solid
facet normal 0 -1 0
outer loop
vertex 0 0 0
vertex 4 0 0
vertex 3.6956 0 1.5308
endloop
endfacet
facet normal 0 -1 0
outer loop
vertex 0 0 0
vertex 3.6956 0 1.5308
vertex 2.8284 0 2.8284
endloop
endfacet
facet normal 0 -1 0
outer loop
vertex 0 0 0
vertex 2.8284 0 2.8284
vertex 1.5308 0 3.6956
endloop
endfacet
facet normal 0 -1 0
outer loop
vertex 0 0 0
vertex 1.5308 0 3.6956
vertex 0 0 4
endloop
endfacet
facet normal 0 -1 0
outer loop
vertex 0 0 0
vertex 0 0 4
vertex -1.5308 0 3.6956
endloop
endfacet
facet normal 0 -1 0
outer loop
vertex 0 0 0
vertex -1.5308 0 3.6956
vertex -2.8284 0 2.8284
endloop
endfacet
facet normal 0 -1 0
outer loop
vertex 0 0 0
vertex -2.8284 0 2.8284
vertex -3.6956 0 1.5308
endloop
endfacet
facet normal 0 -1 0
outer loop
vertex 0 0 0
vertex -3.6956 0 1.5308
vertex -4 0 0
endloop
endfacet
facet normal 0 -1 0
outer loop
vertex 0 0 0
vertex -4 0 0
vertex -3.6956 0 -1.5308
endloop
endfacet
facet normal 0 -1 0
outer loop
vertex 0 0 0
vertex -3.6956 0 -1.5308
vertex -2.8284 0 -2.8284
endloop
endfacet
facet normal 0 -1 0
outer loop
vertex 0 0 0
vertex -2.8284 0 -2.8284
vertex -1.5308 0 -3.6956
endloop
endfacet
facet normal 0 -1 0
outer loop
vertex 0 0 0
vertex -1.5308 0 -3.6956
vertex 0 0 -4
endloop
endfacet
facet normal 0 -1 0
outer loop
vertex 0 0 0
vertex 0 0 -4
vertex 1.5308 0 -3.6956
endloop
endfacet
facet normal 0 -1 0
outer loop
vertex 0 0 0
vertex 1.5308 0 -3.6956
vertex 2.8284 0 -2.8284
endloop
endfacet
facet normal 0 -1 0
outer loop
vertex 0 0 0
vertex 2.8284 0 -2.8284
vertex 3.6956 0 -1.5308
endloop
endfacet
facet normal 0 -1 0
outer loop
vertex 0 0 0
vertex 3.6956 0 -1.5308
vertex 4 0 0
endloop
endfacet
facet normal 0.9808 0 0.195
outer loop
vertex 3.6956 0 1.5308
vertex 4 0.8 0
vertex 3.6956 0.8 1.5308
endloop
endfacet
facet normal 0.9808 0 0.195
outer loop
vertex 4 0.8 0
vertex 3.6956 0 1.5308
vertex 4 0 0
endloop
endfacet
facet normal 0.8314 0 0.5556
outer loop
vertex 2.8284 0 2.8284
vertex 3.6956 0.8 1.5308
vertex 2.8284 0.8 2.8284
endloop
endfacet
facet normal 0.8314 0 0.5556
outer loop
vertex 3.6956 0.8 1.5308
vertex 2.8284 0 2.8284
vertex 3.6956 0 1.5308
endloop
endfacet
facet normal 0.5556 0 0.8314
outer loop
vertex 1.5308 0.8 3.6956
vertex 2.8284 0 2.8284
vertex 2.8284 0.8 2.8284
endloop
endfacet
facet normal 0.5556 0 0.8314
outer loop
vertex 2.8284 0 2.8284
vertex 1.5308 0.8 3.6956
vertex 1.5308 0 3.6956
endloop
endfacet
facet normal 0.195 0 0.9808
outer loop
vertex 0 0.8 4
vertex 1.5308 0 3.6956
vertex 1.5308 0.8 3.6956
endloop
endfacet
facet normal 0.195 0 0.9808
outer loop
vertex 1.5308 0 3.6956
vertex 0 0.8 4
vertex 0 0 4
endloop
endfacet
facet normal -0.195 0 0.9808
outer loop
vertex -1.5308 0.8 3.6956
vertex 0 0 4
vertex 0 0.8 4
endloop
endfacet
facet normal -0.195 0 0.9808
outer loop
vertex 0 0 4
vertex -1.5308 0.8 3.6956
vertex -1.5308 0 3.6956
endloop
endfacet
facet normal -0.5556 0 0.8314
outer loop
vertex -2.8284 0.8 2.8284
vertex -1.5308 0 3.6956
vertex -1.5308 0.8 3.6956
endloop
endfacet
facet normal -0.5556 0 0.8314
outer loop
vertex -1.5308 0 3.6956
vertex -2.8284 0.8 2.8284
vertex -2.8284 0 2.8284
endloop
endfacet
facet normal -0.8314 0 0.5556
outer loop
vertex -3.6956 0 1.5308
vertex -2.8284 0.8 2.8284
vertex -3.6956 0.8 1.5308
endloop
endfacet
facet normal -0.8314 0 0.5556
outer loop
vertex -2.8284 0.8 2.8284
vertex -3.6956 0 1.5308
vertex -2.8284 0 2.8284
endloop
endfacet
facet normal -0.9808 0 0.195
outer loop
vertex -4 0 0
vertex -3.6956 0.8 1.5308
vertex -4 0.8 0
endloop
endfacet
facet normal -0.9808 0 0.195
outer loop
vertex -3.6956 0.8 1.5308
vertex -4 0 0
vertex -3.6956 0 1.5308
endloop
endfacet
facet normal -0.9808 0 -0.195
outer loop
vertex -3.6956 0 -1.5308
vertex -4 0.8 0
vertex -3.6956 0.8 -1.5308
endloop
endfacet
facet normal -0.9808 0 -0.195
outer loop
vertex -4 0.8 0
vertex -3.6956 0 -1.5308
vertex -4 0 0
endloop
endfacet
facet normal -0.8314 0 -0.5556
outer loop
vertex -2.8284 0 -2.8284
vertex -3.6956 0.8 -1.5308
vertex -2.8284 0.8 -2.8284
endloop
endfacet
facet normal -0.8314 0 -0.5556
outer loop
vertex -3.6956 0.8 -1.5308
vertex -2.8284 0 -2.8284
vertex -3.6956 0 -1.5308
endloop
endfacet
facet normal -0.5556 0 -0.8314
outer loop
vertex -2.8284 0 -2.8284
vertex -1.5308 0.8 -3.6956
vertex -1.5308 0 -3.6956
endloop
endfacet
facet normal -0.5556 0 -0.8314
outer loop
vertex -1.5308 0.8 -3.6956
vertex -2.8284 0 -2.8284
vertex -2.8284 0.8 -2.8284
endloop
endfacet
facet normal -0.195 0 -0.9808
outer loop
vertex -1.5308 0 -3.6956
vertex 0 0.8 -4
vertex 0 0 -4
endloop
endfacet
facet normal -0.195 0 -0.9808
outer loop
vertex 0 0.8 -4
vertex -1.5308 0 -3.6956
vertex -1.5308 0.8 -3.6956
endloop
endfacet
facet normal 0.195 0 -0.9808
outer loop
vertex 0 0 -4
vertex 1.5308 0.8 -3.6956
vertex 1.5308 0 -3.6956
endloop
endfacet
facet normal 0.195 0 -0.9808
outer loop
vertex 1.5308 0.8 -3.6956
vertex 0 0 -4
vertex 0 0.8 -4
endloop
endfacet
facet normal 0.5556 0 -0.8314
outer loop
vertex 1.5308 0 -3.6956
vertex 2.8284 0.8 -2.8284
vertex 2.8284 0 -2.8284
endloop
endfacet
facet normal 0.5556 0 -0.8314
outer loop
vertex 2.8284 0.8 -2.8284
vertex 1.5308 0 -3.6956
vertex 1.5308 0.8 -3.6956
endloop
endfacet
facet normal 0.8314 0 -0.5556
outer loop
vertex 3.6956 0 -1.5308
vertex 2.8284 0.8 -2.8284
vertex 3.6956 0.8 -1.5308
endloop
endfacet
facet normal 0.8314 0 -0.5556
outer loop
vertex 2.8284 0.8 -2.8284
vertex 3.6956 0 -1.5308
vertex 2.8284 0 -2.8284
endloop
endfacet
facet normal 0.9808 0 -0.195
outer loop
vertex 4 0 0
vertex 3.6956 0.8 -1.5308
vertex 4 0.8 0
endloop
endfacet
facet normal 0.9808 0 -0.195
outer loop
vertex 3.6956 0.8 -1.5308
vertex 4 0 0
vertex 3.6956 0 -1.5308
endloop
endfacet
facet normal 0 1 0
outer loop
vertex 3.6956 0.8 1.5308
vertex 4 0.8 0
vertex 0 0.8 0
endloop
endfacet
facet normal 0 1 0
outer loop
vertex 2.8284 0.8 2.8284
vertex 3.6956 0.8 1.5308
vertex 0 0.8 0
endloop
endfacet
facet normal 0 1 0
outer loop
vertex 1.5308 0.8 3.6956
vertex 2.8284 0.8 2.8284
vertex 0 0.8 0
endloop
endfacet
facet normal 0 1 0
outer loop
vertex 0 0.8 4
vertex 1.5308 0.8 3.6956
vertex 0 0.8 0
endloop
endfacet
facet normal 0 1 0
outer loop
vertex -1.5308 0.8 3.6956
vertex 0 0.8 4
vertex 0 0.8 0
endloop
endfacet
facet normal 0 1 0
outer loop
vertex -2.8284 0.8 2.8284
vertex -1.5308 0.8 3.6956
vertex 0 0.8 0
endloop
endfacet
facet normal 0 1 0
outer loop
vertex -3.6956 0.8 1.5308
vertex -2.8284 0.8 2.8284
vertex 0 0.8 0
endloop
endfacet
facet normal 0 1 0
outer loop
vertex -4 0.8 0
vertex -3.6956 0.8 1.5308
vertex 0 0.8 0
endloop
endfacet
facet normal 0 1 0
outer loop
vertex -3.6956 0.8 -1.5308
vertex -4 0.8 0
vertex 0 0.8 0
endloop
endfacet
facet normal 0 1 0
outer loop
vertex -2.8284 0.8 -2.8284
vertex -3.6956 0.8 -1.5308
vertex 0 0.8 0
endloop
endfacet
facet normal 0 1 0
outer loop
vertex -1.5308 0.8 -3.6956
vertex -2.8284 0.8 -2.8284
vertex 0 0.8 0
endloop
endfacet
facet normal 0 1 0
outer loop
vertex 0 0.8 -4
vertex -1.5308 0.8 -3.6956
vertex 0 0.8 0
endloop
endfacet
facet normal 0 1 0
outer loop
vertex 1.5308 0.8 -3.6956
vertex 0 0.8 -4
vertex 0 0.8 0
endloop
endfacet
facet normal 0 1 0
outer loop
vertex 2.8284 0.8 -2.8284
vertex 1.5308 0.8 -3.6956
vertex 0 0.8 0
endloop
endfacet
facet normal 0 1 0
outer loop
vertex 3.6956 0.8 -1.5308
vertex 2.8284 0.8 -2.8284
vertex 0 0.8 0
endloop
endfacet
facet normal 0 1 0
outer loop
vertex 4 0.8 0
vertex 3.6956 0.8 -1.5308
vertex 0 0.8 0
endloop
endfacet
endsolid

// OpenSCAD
// file: ../p/4-4edge.scad
use <../lib.scad>
function ldraw_lib__4_4edge() = [
// 0 Circle 1.0
// 0 Name: 4-4edge.dat
// 0 Author: James Jessiman
// 0 !LDRAW_ORG Primitive UPDATE 2017-01
// 0 !LICENSE Licensed under CC BY 4.0 : see CAreadme.txt
// 
// 0 BFC CERTIFY CCW
  [0,"BFC","CERTIFY"],
  [0,"BFC","CCW"],
// 
// 0 !HISTORY 1998-12-15 [PTadmin] Official Update 1998-10
// 0 !HISTORY 2005-12-28 [PTadmin] Official Update 2005-01
// 0 !HISTORY 2007-06-24 [PTadmin] Header formatted for Contributor Agreement
// 0 !HISTORY 2008-07-01 [PTadmin] Official Update 2008-01
// 0 !HISTORY 2017-01-15 [Steffen] BFCed
// 0 !HISTORY 2017-12-30 [PTadmin] Official Update 2017-01
// 
// 
// 2 24 1 0 0 0.9239 0 0.3827
  [2,24,1,0,0,0.9239,0,0.3827],
// 2 24 0.9239 0 0.3827 0.7071 0 0.7071
  [2,24,0.9239,0,0.3827,0.7071,0,0.7071],
// 2 24 0.7071 0 0.7071 0.3827 0 0.9239
  [2,24,0.7071,0,0.7071,0.3827,0,0.9239],
// 2 24 0.3827 0 0.9239 0 0 1
  [2,24,0.3827,0,0.9239,0,0,1],
// 2 24 0 0 1 -0.3827 0 0.9239
  [2,24,0,0,1,-0.3827,0,0.9239],
// 2 24 -0.3827 0 0.9239 -0.7071 0 0.7071
  [2,24,-0.3827,0,0.9239,-0.7071,0,0.7071],
// 2 24 -0.7071 0 0.7071 -0.9239 0 0.3827
  [2,24,-0.7071,0,0.7071,-0.9239,0,0.3827],
// 2 24 -0.9239 0 0.3827 -1 0 -0
  [2,24,-0.9239,0,0.3827,-1,0,-0],
// 2 24 -1 0 -0 -0.9239 0 -0.3827
  [2,24,-1,0,-0,-0.9239,0,-0.3827],
// 2 24 -0.9239 0 -0.3827 -0.7071 0 -0.7071
  [2,24,-0.9239,0,-0.3827,-0.7071,0,-0.7071],
// 2 24 -0.7071 0 -0.7071 -0.3827 0 -0.9239
  [2,24,-0.7071,0,-0.7071,-0.3827,0,-0.9239],
// 2 24 -0.3827 0 -0.9239 0 0 -1
  [2,24,-0.3827,0,-0.9239,0,0,-1],
// 2 24 0 0 -1 0.3827 0 -0.9239
  [2,24,0,0,-1,0.3827,0,-0.9239],
// 2 24 0.3827 0 -0.9239 0.7071 0 -0.7071
  [2,24,0.3827,0,-0.9239,0.7071,0,-0.7071],
// 2 24 0.7071 0 -0.7071 0.9239 0 -0.3827
  [2,24,0.7071,0,-0.7071,0.9239,0,-0.3827],
// 2 24 0.9239 0 -0.3827 1 0 0
  [2,24,0.9239,0,-0.3827,1,0,0],
];
module ldraw_lib__4_4edge(step=0, col=false, unit=2/5, alt=false, line=0.2, solid=!$preview)
    makepoly(ldraw_lib__4_4edge(), step=step, col=col, unit=unit, alt=alt, line=line, solid=solid);
ldraw_lib__4_4edge(line=0.2);
// file: ../p/4-4cyli.scad
use <../lib.scad>
function ldraw_lib__4_4cyli() = [
// 0 Cylinder 1.0
// 0 Name: 4-4cyli.dat
// 0 Author: James Jessiman
// 0 !LDRAW_ORG Primitive UPDATE 2005-01
// 0 !LICENSE Licensed under CC BY 4.0 : see CAreadme.txt
// 
// 0 BFC CERTIFY CCW
  [0,"BFC","CERTIFY"],
  [0,"BFC","CCW"],
// 
// 0 !HISTORY 1998-12-15 [PTadmin] Official Update 1998-10
// 0 !HISTORY 2002-03-23 [sbliss] Added BFC statement; merged headers from files in distributions LDraw 0.27 and Complete.
// 0 !HISTORY 2002-04-25 [PTadmin] Official Update 2002-02
// 0 !HISTORY 2004-12-14 [guyvivan] BFC CCW
// 0 !HISTORY 2005-12-28 [PTadmin] Official Update 2005-01
// 0 !HISTORY 2007-06-24 [PTadmin] Header formatted for Contributor Agreement
// 0 !HISTORY 2008-07-01 [PTadmin] Official Update 2008-01
// 
// 
// 4 16 1 1 0 0.9239 1 0.3827 0.9239 0 0.3827 1 0 0
  [4,16,1,1,0,0.9239,1,0.3827,0.9239,0,0.3827,1,0,0],
// 5 24 1 0 0 1 1 0 0.9239 0 0.3827 0.9239 0 -0.3827
  [5,24,1,0,0,1,1,0,0.9239,0,0.3827,0.9239,0,-0.3827],
// 4 16 0.9239 1 0.3827 0.7071 1 0.7071 0.7071 0 0.7071 0.9239 0 0.3827
  [4,16,0.9239,1,0.3827,0.7071,1,0.7071,0.7071,0,0.7071,0.9239,0,0.3827],
// 5 24 0.9239 0 0.3827 0.9239 1 0.3827 0.7071 0 0.7071 1 0 0
  [5,24,0.9239,0,0.3827,0.9239,1,0.3827,0.7071,0,0.7071,1,0,0],
// 4 16 0.7071 1 0.7071 0.3827 1 0.9239 0.3827 0 0.9239 0.7071 0 0.7071
  [4,16,0.7071,1,0.7071,0.3827,1,0.9239,0.3827,0,0.9239,0.7071,0,0.7071],
// 5 24 0.7071 0 0.7071 0.7071 1 0.7071 0.3827 0 0.9239 0.9239 0 0.3827
  [5,24,0.7071,0,0.7071,0.7071,1,0.7071,0.3827,0,0.9239,0.9239,0,0.3827],
// 4 16 0.3827 1 0.9239 0 1 1 0 0 1 0.3827 0 0.9239
  [4,16,0.3827,1,0.9239,0,1,1,0,0,1,0.3827,0,0.9239],
// 5 24 0.3827 0 0.9239 0.3827 1 0.9239 0 0 1 0.7071 0 0.7071
  [5,24,0.3827,0,0.9239,0.3827,1,0.9239,0,0,1,0.7071,0,0.7071],
// 4 16 0 1 1 -0.3827 1 0.9239 -0.3827 0 0.9239 0 0 1
  [4,16,0,1,1,-0.3827,1,0.9239,-0.3827,0,0.9239,0,0,1],
// 5 24 0 0 1 0 1 1 -0.3827 0 0.9239 0.3827 0 0.9239
  [5,24,0,0,1,0,1,1,-0.3827,0,0.9239,0.3827,0,0.9239],
// 4 16 -0.3827 1 0.9239 -0.7071 1 0.7071 -0.7071 0 0.7071 -0.3827 0 0.9239
  [4,16,-0.3827,1,0.9239,-0.7071,1,0.7071,-0.7071,0,0.7071,-0.3827,0,0.9239],
// 5 24 -0.3827 0 0.9239 -0.3827 1 0.9239 -0.7071 0 0.7071 0 0 1
  [5,24,-0.3827,0,0.9239,-0.3827,1,0.9239,-0.7071,0,0.7071,0,0,1],
// 4 16 -0.7071 1 0.7071 -0.9239 1 0.3827 -0.9239 0 0.3827 -0.7071 0 0.7071
  [4,16,-0.7071,1,0.7071,-0.9239,1,0.3827,-0.9239,0,0.3827,-0.7071,0,0.7071],
// 5 24 -0.7071 0 0.7071 -0.7071 1 0.7071 -0.9239 0 0.3827 -0.3827 0 0.9239
  [5,24,-0.7071,0,0.7071,-0.7071,1,0.7071,-0.9239,0,0.3827,-0.3827,0,0.9239],
// 4 16 -0.9239 1 0.3827 -1 1 0 -1 0 0 -0.9239 0 0.3827
  [4,16,-0.9239,1,0.3827,-1,1,0,-1,0,0,-0.9239,0,0.3827],
// 5 24 -0.9239 0 0.3827 -0.9239 1 0.3827 -1 0 0 -0.7071 0 0.7071
  [5,24,-0.9239,0,0.3827,-0.9239,1,0.3827,-1,0,0,-0.7071,0,0.7071],
// 4 16 -1 1 0 -0.9239 1 -0.3827 -0.9239 0 -0.3827 -1 0 0
  [4,16,-1,1,0,-0.9239,1,-0.3827,-0.9239,0,-0.3827,-1,0,0],
// 5 24 -1 0 0 -1 1 0 -0.9239 0 -0.3827 -0.9239 0 0.3827
  [5,24,-1,0,0,-1,1,0,-0.9239,0,-0.3827,-0.9239,0,0.3827],
// 4 16 -0.9239 1 -0.3827 -0.7071 1 -0.7071 -0.7071 0 -0.7071 -0.9239 0 -0.3827
  [4,16,-0.9239,1,-0.3827,-0.7071,1,-0.7071,-0.7071,0,-0.7071,-0.9239,0,-0.3827],
// 5 24 -0.9239 0 -0.3827 -0.9239 1 -0.3827 -0.7071 0 -0.7071 -1 0 0
  [5,24,-0.9239,0,-0.3827,-0.9239,1,-0.3827,-0.7071,0,-0.7071,-1,0,0],
// 4 16 -0.7071 1 -0.7071 -0.3827 1 -0.9239 -0.3827 0 -0.9239 -0.7071 0 -0.7071
  [4,16,-0.7071,1,-0.7071,-0.3827,1,-0.9239,-0.3827,0,-0.9239,-0.7071,0,-0.7071],
// 5 24 -0.7071 0 -0.7071 -0.7071 1 -0.7071 -0.3827 0 -0.9239 -0.9239 0 -0.3827
  [5,24,-0.7071,0,-0.7071,-0.7071,1,-0.7071,-0.3827,0,-0.9239,-0.9239,0,-0.3827],
// 4 16 -0.3827 1 -0.9239 0 1 -1 0 0 -1 -0.3827 0 -0.9239
  [4,16,-0.3827,1,-0.9239,0,1,-1,0,0,-1,-0.3827,0,-0.9239],
// 5 24 -0.3827 0 -0.9239 -0.3827 1 -0.9239 0 0 -1 -0.7071 0 -0.7071
  [5,24,-0.3827,0,-0.9239,-0.3827,1,-0.9239,0,0,-1,-0.7071,0,-0.7071],
// 4 16 0 1 -1 0.3827 1 -0.9239 0.3827 0 -0.9239 0 0 -1
  [4,16,0,1,-1,0.3827,1,-0.9239,0.3827,0,-0.9239,0,0,-1],
// 5 24 0 0 -1 0 1 -1 0.3827 0 -0.9239 -0.3827 0 -0.9239
  [5,24,0,0,-1,0,1,-1,0.3827,0,-0.9239,-0.3827,0,-0.9239],
// 4 16 0.3827 1 -0.9239 0.7071 1 -0.7071 0.7071 0 -0.7071 0.3827 0 -0.9239
  [4,16,0.3827,1,-0.9239,0.7071,1,-0.7071,0.7071,0,-0.7071,0.3827,0,-0.9239],
// 5 24 0.3827 0 -0.9239 0.3827 1 -0.9239 0.7071 0 -0.7071 0 0 -1
  [5,24,0.3827,0,-0.9239,0.3827,1,-0.9239,0.7071,0,-0.7071,0,0,-1],
// 4 16 0.7071 1 -0.7071 0.9239 1 -0.3827 0.9239 0 -0.3827 0.7071 0 -0.7071
  [4,16,0.7071,1,-0.7071,0.9239,1,-0.3827,0.9239,0,-0.3827,0.7071,0,-0.7071],
// 5 24 0.7071 0 -0.7071 0.7071 1 -0.7071 0.9239 0 -0.3827 0.3827 0 -0.9239
  [5,24,0.7071,0,-0.7071,0.7071,1,-0.7071,0.9239,0,-0.3827,0.3827,0,-0.9239],
// 4 16 0.9239 1 -0.3827 1 1 0 1 0 0 0.9239 0 -0.3827
  [4,16,0.9239,1,-0.3827,1,1,0,1,0,0,0.9239,0,-0.3827],
// 5 24 0.9239 0 -0.3827 0.9239 1 -0.3827 1 0 0 0.7071 0 -0.7071
  [5,24,0.9239,0,-0.3827,0.9239,1,-0.3827,1,0,0,0.7071,0,-0.7071],
// 0
];
module ldraw_lib__4_4cyli(step=0, col=false, unit=2/5, alt=false, line=0.2, solid=!$preview)
    makepoly(ldraw_lib__4_4cyli(), step=step, col=col, unit=unit, alt=alt, line=line, solid=solid);
ldraw_lib__4_4cyli(line=0.2);
// file: ../p/4-4disc.scad
use <../lib.scad>
function ldraw_lib__4_4disc() = [
// 0 Disc 1.0
// 0 Name: 4-4disc.dat
// 0 Author: James Jessiman
// 0 !LDRAW_ORG Primitive UPDATE 2002-02
// 0 !LICENSE Licensed under CC BY 4.0 : see CAreadme.txt
// 
// 0 BFC CERTIFY CCW
  [0,"BFC","CERTIFY"],
  [0,"BFC","CCW"],
// 
// 0 !HISTORY 1998-12-15 [PTadmin] Official Update 1998-10
// 0 !HISTORY 2002-03-23 [sbliss] Added BFC statement
// 0 !HISTORY 2002-04-25 [PTadmin] Official Update 2002-02
// 0 !HISTORY 2007-06-24 [PTadmin] Header formatted for Contributor Agreement
// 0 !HISTORY 2008-07-01 [PTadmin] Official Update 2008-01
// 
// 
// 3 16 0 0 0 1 0 0 0.9239 0 0.3827
  [3,16,0,0,0,1,0,0,0.9239,0,0.3827],
// 3 16 0 0 0 0.9239 0 0.3827 0.7071 0 0.7071
  [3,16,0,0,0,0.9239,0,0.3827,0.7071,0,0.7071],
// 3 16 0 0 0 0.7071 0 0.7071 0.3827 0 0.9239
  [3,16,0,0,0,0.7071,0,0.7071,0.3827,0,0.9239],
// 3 16 0 0 0 0.3827 0 0.9239 0 0 1
  [3,16,0,0,0,0.3827,0,0.9239,0,0,1],
// 3 16 0 0 0 0 0 1 -0.3827 0 0.9239
  [3,16,0,0,0,0,0,1,-0.3827,0,0.9239],
// 3 16 0 0 0 -0.3827 0 0.9239 -0.7071 0 0.7071
  [3,16,0,0,0,-0.3827,0,0.9239,-0.7071,0,0.7071],
// 3 16 0 0 0 -0.7071 0 0.7071 -0.9239 0 0.3827
  [3,16,0,0,0,-0.7071,0,0.7071,-0.9239,0,0.3827],
// 3 16 0 0 0 -0.9239 0 0.3827 -1 0 -0
  [3,16,0,0,0,-0.9239,0,0.3827,-1,0,-0],
// 3 16 0 0 0 -1 0 -0 -0.9239 0 -0.3827
  [3,16,0,0,0,-1,0,-0,-0.9239,0,-0.3827],
// 3 16 0 0 0 -0.9239 0 -0.3827 -0.7071 0 -0.7071
  [3,16,0,0,0,-0.9239,0,-0.3827,-0.7071,0,-0.7071],
// 3 16 0 0 0 -0.7071 0 -0.7071 -0.3827 0 -0.9239
  [3,16,0,0,0,-0.7071,0,-0.7071,-0.3827,0,-0.9239],
// 3 16 0 0 0 -0.3827 0 -0.9239 0 0 -1
  [3,16,0,0,0,-0.3827,0,-0.9239,0,0,-1],
// 3 16 0 0 0 0 0 -1 0.3827 0 -0.9239
  [3,16,0,0,0,0,0,-1,0.3827,0,-0.9239],
// 3 16 0 0 0 0.3827 0 -0.9239 0.7071 0 -0.7071
  [3,16,0,0,0,0.3827,0,-0.9239,0.7071,0,-0.7071],
// 3 16 0 0 0 0.7071 0 -0.7071 0.9239 0 -0.3827
  [3,16,0,0,0,0.7071,0,-0.7071,0.9239,0,-0.3827],
// 3 16 0 0 0 0.9239 0 -0.3827 1 0 0
  [3,16,0,0,0,0.9239,0,-0.3827,1,0,0],
// 0
];
module ldraw_lib__4_4disc(step=0, col=false, unit=2/5, alt=false, line=0.2, solid=!$preview)
    makepoly(ldraw_lib__4_4disc(), step=step, col=col, unit=unit, alt=alt, line=line, solid=solid);
ldraw_lib__4_4disc(line=0.2);
// file: ../p/4-4cylc.scad
use <../lib.scad>
use <4-4cyli.scad>
use <4-4disc.scad>
use <4-4edge.scad>
function ldraw_lib__4_4cylc() = [
// 0 Cylinder Closed 1.0
// 0 Name: 4-4cylc.dat
// 0 Author: Alex Taylor [anathema]
// 0 !LDRAW_ORG Primitive UPDATE 2009-02
// 0 !LICENSE Licensed under CC BY 4.0 : see CAreadme.txt
// 
// 0 BFC CERTIFY CCW
  [0,"BFC","CERTIFY"],
  [0,"BFC","CCW"],
// 
// 0 !HISTORY 2008-12-29 [cwdee] Removed one disc
// 0 !HISTORY 2009-09-03 [PTadmin] Official Update 2009-02
// 
// 
// 1 16 0 0 0 1 0 0 0 1 0 0 0 1 4-4edge.dat
  [1,16,0,0,0,1,0,0,0,1,0,0,0,1, ldraw_lib__4_4edge()],
// 1 16 0 1 0 1 0 0 0 1 0 0 0 1 4-4edge.dat
  [1,16,0,1,0,1,0,0,0,1,0,0,0,1, ldraw_lib__4_4edge()],
// 1 16 0 0 0 1 0 0 0 1 0 0 0 1 4-4disc.dat
  [1,16,0,0,0,1,0,0,0,1,0,0,0,1, ldraw_lib__4_4disc()],
// 1 16 0 0 0 1 0 0 0 1 0 0 0 1 4-4cyli.dat
  [1,16,0,0,0,1,0,0,0,1,0,0,0,1, ldraw_lib__4_4cyli()],
// 0
];
module ldraw_lib__4_4cylc(step=0, col=false, unit=2/5, alt=false, line=0.2, solid=!$preview)
    makepoly(ldraw_lib__4_4cylc(), step=step, col=col, unit=unit, alt=alt, line=line, solid=solid);
ldraw_lib__4_4cylc(line=0.2);
// main file
use <../lib.scad>
use <../p/4-4cylc.scad>
use <../p/4-4disc.scad>
function ldraw_lib__u9644() = [
// 0 ~Electric 9V Battery Box  4 x 14 x  4 Bottom - Contact Extenter
// 0 Name: u9644.dat
// 0 Author: Gerald Lasser [GeraldLasser]
// 0 !LDRAW_ORG Part UPDATE 2024-08
// 0 !LICENSE Licensed under CC BY 4.0 : see CAreadme.txt
// 
// 0 BFC CERTIFY CCW
  [0,"BFC","CERTIFY"],
  [0,"BFC","CCW"],
// 
// 0 !HISTORY 2024-09-30 [OrionP] Official Update 2024-08
// 
// 1 16 0 0 0 10 0 0 0 0 -10 0 2 0 4-4cylc.dat
  [1,16,0,0,0,10,0,0,0,0,-10,0,2,0, ldraw_lib__4_4cylc()],
// 1 16 0 0 2 10 0 0 0 0 -10 0 -1 0 4-4disc.dat
  [1,16,0,0,2,10,0,0,0,0,-10,0,-1,0, ldraw_lib__4_4disc()],
];
module ldraw_lib__u9644(step=0, col=false, unit=2/5, alt=false, line=0.2, solid=!$preview)
    makepoly(ldraw_lib__u9644(), step=step, col=col, unit=unit, alt=alt, line=line, solid=solid);
ldraw_lib__u9644(line=0.2);
